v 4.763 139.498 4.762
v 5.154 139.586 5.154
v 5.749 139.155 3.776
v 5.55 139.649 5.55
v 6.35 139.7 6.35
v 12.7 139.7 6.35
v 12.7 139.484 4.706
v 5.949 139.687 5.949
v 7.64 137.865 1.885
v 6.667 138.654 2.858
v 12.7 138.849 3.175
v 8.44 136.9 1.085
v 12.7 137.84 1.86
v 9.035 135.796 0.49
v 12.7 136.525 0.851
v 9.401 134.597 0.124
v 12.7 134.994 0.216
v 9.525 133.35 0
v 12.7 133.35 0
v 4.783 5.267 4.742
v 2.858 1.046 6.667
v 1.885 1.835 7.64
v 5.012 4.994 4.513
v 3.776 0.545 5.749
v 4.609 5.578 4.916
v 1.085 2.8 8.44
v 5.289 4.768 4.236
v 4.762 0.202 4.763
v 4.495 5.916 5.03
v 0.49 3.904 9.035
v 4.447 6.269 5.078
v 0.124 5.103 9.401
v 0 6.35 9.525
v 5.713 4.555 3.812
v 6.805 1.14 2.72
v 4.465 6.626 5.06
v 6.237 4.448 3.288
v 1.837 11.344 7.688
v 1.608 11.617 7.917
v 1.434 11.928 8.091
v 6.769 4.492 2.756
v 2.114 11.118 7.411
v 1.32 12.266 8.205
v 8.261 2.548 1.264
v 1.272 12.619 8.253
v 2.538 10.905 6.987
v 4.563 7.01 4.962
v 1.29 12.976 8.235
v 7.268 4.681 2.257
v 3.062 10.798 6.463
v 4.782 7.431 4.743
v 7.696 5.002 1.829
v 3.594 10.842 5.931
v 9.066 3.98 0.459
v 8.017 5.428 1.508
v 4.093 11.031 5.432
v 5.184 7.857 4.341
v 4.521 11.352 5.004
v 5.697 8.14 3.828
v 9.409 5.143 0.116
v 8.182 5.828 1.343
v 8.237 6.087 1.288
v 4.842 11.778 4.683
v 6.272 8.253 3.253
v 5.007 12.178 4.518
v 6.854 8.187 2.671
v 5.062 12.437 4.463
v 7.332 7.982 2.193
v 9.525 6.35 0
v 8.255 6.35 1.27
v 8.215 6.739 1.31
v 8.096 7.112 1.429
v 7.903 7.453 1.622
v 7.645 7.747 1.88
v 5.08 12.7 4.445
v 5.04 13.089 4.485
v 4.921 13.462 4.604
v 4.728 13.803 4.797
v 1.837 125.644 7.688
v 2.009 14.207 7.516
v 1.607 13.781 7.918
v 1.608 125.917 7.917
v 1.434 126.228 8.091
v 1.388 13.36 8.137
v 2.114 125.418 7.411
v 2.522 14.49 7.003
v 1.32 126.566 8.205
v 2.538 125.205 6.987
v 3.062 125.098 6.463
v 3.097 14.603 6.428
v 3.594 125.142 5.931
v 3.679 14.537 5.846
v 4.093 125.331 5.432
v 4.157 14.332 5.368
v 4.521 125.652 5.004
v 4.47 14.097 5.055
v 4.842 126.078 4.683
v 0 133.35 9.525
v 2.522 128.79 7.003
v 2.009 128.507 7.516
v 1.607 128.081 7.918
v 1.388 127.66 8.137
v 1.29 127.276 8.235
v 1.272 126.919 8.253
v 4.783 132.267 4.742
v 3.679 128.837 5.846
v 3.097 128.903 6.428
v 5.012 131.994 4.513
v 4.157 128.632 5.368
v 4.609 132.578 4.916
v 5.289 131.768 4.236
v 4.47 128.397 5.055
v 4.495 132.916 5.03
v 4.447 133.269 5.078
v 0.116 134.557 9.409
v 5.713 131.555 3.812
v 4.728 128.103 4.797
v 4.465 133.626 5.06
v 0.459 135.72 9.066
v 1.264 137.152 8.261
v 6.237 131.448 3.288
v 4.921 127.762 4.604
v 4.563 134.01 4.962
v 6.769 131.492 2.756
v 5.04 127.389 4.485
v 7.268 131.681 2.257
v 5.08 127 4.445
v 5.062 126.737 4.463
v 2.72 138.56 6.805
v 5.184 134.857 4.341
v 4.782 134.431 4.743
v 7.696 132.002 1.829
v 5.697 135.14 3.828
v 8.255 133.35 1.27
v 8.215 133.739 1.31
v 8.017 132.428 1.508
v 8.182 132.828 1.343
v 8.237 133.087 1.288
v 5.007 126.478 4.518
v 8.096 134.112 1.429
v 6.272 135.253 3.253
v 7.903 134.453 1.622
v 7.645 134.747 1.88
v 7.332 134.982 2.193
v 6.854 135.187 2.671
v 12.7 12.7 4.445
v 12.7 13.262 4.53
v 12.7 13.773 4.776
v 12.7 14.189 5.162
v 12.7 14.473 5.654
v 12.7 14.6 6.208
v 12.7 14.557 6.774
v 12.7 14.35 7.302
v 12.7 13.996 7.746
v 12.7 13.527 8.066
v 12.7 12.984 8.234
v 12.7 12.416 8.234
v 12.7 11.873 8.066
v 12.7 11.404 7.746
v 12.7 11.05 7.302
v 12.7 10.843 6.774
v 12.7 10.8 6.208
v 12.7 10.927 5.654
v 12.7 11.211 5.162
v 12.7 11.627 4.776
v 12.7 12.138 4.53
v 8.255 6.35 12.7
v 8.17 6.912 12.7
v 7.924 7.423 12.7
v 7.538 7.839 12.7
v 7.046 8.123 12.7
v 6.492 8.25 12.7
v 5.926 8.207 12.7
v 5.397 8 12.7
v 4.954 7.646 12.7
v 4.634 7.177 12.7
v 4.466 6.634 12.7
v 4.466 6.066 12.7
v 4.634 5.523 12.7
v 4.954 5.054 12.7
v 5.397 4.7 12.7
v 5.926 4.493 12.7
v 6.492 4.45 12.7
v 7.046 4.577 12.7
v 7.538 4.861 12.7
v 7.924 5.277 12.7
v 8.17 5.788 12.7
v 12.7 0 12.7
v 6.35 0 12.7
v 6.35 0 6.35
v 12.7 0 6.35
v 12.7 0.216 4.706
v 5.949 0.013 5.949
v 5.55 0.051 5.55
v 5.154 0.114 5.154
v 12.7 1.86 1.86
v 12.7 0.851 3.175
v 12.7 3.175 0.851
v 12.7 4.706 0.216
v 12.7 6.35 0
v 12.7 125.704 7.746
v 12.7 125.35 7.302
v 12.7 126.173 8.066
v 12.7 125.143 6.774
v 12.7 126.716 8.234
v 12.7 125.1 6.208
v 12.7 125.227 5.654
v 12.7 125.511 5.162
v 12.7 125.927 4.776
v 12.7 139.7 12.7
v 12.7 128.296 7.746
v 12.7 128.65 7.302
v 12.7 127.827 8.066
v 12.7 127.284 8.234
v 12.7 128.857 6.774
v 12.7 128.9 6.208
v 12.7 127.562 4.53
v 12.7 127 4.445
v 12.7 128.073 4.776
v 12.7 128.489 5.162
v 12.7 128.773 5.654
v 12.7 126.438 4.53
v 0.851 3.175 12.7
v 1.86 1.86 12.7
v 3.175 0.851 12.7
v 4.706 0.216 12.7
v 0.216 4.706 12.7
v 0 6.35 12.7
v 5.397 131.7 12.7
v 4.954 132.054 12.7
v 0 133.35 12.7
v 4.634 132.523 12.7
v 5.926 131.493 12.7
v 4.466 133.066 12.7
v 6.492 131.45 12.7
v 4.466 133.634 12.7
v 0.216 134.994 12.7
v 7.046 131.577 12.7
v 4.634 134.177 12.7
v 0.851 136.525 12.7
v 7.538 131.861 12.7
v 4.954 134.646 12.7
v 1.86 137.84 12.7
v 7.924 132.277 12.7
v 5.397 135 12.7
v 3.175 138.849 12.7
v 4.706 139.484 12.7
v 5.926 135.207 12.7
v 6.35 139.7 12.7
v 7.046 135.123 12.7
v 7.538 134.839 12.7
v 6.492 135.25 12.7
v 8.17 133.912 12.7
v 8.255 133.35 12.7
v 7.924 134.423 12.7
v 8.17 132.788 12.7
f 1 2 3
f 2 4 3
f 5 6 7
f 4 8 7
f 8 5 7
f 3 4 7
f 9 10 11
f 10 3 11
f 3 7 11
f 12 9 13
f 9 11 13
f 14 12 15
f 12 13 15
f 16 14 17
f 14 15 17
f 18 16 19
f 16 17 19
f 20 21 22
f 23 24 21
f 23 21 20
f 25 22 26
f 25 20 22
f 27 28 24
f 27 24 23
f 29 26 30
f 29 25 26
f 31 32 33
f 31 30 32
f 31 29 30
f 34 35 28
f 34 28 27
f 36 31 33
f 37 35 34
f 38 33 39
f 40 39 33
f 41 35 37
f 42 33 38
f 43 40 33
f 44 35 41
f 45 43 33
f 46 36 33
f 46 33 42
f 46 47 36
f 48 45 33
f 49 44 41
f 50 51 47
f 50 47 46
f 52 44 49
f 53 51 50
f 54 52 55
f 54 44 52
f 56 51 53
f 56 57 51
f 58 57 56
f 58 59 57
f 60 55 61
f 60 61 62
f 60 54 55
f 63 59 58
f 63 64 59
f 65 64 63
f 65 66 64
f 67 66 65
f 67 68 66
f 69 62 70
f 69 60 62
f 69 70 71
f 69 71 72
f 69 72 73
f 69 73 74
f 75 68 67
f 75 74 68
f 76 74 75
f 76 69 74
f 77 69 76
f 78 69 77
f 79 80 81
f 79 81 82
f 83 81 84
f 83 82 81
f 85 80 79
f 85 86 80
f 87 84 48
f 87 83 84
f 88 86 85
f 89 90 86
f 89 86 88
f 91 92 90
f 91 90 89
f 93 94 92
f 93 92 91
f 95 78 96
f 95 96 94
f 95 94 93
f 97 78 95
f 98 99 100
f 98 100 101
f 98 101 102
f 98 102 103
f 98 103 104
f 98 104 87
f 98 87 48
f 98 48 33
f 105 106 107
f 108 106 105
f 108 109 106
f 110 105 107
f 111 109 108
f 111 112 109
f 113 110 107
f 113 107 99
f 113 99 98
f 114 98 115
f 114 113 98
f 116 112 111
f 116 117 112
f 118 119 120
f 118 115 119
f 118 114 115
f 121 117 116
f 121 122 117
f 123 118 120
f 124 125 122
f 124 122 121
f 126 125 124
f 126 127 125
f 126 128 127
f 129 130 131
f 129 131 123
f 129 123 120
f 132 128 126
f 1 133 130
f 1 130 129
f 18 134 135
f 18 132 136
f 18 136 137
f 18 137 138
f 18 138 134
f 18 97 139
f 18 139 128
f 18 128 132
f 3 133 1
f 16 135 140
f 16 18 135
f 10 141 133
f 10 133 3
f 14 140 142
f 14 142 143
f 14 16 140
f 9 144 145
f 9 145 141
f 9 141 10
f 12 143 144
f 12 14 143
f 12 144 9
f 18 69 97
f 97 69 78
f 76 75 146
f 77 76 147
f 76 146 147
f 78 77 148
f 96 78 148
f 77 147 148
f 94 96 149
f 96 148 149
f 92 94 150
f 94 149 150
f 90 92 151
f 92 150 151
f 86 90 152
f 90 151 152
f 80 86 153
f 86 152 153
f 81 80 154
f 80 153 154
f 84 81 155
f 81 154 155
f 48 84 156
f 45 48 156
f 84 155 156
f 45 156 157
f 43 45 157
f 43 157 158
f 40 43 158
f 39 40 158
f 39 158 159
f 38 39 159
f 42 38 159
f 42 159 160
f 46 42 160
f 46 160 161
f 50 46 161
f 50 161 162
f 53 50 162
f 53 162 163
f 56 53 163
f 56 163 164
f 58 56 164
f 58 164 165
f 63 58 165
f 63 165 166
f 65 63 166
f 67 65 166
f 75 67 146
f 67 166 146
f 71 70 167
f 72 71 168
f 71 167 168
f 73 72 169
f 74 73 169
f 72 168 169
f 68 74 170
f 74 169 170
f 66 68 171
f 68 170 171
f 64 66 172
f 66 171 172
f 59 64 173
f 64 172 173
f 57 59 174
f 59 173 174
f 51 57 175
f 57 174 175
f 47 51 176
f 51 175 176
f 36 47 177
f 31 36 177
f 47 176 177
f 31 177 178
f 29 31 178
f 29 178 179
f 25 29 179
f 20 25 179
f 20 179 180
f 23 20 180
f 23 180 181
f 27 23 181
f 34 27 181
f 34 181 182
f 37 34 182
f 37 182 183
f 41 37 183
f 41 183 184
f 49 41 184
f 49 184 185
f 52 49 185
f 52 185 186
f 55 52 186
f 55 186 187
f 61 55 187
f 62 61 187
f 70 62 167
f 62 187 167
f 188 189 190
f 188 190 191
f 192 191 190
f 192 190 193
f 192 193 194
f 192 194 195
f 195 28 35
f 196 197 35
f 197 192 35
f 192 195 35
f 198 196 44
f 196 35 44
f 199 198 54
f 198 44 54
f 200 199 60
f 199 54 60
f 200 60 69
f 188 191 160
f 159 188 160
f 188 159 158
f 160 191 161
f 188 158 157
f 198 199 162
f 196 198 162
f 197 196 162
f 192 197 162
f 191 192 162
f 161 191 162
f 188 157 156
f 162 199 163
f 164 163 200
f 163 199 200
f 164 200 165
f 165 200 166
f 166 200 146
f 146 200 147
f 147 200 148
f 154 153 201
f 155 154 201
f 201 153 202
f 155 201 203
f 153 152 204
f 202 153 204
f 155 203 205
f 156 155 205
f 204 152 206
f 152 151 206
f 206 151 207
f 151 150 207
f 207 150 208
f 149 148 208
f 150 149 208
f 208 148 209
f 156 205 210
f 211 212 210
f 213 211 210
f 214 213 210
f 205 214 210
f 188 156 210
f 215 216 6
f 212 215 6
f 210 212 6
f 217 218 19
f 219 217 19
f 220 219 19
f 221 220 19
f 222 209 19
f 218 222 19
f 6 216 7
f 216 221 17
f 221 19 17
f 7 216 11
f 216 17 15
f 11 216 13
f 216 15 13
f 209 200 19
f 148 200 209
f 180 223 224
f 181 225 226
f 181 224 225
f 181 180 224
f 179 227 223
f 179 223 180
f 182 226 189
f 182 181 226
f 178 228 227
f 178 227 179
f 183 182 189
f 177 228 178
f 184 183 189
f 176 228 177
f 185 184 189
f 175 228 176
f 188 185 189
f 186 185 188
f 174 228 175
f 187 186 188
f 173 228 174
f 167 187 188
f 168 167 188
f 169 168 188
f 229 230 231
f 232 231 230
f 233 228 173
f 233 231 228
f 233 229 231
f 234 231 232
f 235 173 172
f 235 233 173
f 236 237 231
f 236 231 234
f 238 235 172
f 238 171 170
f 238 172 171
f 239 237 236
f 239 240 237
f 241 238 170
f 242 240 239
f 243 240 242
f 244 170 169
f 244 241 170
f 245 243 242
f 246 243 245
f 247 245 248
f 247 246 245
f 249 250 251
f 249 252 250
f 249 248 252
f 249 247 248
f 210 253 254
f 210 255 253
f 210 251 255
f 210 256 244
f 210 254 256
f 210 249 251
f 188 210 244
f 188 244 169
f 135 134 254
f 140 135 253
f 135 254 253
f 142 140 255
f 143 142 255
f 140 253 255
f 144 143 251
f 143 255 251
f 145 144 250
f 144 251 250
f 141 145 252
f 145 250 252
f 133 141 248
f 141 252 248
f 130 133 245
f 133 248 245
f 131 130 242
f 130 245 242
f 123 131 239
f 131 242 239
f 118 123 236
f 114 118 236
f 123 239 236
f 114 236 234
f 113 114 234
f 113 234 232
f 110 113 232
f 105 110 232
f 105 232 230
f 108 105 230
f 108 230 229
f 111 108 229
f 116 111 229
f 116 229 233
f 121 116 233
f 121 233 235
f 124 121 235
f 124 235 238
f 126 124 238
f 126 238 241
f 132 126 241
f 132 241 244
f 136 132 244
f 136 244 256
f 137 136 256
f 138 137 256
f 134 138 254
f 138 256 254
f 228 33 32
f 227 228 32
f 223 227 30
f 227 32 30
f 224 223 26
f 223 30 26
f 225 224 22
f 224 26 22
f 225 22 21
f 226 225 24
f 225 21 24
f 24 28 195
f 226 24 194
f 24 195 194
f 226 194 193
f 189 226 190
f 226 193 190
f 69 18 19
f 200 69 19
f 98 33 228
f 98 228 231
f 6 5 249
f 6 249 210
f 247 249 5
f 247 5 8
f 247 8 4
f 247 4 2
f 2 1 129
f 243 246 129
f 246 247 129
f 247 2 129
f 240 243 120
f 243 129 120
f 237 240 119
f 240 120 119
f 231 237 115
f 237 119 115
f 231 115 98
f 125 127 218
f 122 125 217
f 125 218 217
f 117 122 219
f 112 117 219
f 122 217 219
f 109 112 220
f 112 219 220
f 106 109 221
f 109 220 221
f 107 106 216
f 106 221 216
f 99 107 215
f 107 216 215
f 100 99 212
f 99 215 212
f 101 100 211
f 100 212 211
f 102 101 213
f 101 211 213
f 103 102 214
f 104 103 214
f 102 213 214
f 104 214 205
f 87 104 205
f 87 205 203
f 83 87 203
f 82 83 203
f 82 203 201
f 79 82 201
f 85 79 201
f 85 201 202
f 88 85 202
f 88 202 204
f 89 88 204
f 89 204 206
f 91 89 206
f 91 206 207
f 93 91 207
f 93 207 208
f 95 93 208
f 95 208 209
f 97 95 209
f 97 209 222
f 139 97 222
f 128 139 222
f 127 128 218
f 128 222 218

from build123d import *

# Parameters (mm, degrees)
SKETCH1_W           = 12.7
SKETCH1_H           = 139.7
BOSS_EXTRUDE1_DEPTH = 12.7
CHAMFER1_SIZE       = 9.525
SKETCH2_R           = 1.905
CUT_EXTRUDE1_DEPTH  = 141.849813631
SKETCH3_R           = 1.905
CUT_EXTRUDE2_DEPTH  = 141.849813631
FILLET1_R           = 6.35


with BuildPart() as part:
    # Sketch1 → Boss-Extrude1 (new body)
    with BuildSketch(Plane.XY):
        with Locations((6.35, 69.85)):
            Rectangle(SKETCH1_W, SKETCH1_H)
    extrude(amount=BOSS_EXTRUDE1_DEPTH)

    # Chamfer1
    chamfer1_edges = [part.edges().sort_by_distance(p)[0] for p in [
        (0, 69.85, 0),
    ]]
    chamfer(chamfer1_edges, length=CHAMFER1_SIZE)

    # Sketch2 → Cut-Extrude1 (cut, through all)
    with BuildSketch(Plane.XY.offset(12.7)):
        with Locations((6.35, 133.35)):
            Circle(SKETCH2_R)
        with Locations((6.35, 6.35)):
            Circle(SKETCH2_R)
    extrude(amount=-CUT_EXTRUDE1_DEPTH, mode=Mode.SUBTRACT)

    # Sketch3 → Cut-Extrude2 (cut, through all)
    with BuildSketch(Plane(origin=(12.7, 0, 0), x_dir=(0, 0, -1), z_dir=(1, 0, 0))):
        with Locations((-6.35, 127)):
            Circle(SKETCH3_R)
        with Locations((-6.35, 12.7)):
            Circle(SKETCH3_R)
    extrude(amount=-CUT_EXTRUDE2_DEPTH, mode=Mode.SUBTRACT)

    # Fillet1
    # the kernel refuses this fillet: 6.35 mm, written as the material it takes off along each edge
    with BuildSketch(Plane(origin=(28.575, 139.7, 0), x_dir=(0, -1, 0), z_dir=(-1, 0, 0)), Plane(origin=(0, 139.7, -6.35), x_dir=(0, -1, 0), z_dir=(0, 0, 1)), Plane(origin=(0, 0, -6.35), x_dir=(1, 0, 0), z_dir=(0, 0, 1))) as fillet1_piece_1:
        with BuildLine():
            CenterArc((FILLET1_R, FILLET1_R), FILLET1_R, 180, 90)
            Line((0, FILLET1_R), (0, 0))
            Line((0, 0), (FILLET1_R, 0))
        make_face()
    extrude(amount=34.925, mode=Mode.SUBTRACT)
    with BuildSketch(Plane(origin=(-6.35, 0, 0), x_dir=(0, 0, 1), z_dir=(1, 0, 0))) as fillet1_piece_2:
        with BuildLine():
            CenterArc((FILLET1_R, -FILLET1_R), FILLET1_R, 90, 90)
            Line((0, -FILLET1_R), (0, 0))
            Line((0, 0), (FILLET1_R, 0))
        make_face()
    extrude(amount=34.925, mode=Mode.SUBTRACT)


solid = part.part
